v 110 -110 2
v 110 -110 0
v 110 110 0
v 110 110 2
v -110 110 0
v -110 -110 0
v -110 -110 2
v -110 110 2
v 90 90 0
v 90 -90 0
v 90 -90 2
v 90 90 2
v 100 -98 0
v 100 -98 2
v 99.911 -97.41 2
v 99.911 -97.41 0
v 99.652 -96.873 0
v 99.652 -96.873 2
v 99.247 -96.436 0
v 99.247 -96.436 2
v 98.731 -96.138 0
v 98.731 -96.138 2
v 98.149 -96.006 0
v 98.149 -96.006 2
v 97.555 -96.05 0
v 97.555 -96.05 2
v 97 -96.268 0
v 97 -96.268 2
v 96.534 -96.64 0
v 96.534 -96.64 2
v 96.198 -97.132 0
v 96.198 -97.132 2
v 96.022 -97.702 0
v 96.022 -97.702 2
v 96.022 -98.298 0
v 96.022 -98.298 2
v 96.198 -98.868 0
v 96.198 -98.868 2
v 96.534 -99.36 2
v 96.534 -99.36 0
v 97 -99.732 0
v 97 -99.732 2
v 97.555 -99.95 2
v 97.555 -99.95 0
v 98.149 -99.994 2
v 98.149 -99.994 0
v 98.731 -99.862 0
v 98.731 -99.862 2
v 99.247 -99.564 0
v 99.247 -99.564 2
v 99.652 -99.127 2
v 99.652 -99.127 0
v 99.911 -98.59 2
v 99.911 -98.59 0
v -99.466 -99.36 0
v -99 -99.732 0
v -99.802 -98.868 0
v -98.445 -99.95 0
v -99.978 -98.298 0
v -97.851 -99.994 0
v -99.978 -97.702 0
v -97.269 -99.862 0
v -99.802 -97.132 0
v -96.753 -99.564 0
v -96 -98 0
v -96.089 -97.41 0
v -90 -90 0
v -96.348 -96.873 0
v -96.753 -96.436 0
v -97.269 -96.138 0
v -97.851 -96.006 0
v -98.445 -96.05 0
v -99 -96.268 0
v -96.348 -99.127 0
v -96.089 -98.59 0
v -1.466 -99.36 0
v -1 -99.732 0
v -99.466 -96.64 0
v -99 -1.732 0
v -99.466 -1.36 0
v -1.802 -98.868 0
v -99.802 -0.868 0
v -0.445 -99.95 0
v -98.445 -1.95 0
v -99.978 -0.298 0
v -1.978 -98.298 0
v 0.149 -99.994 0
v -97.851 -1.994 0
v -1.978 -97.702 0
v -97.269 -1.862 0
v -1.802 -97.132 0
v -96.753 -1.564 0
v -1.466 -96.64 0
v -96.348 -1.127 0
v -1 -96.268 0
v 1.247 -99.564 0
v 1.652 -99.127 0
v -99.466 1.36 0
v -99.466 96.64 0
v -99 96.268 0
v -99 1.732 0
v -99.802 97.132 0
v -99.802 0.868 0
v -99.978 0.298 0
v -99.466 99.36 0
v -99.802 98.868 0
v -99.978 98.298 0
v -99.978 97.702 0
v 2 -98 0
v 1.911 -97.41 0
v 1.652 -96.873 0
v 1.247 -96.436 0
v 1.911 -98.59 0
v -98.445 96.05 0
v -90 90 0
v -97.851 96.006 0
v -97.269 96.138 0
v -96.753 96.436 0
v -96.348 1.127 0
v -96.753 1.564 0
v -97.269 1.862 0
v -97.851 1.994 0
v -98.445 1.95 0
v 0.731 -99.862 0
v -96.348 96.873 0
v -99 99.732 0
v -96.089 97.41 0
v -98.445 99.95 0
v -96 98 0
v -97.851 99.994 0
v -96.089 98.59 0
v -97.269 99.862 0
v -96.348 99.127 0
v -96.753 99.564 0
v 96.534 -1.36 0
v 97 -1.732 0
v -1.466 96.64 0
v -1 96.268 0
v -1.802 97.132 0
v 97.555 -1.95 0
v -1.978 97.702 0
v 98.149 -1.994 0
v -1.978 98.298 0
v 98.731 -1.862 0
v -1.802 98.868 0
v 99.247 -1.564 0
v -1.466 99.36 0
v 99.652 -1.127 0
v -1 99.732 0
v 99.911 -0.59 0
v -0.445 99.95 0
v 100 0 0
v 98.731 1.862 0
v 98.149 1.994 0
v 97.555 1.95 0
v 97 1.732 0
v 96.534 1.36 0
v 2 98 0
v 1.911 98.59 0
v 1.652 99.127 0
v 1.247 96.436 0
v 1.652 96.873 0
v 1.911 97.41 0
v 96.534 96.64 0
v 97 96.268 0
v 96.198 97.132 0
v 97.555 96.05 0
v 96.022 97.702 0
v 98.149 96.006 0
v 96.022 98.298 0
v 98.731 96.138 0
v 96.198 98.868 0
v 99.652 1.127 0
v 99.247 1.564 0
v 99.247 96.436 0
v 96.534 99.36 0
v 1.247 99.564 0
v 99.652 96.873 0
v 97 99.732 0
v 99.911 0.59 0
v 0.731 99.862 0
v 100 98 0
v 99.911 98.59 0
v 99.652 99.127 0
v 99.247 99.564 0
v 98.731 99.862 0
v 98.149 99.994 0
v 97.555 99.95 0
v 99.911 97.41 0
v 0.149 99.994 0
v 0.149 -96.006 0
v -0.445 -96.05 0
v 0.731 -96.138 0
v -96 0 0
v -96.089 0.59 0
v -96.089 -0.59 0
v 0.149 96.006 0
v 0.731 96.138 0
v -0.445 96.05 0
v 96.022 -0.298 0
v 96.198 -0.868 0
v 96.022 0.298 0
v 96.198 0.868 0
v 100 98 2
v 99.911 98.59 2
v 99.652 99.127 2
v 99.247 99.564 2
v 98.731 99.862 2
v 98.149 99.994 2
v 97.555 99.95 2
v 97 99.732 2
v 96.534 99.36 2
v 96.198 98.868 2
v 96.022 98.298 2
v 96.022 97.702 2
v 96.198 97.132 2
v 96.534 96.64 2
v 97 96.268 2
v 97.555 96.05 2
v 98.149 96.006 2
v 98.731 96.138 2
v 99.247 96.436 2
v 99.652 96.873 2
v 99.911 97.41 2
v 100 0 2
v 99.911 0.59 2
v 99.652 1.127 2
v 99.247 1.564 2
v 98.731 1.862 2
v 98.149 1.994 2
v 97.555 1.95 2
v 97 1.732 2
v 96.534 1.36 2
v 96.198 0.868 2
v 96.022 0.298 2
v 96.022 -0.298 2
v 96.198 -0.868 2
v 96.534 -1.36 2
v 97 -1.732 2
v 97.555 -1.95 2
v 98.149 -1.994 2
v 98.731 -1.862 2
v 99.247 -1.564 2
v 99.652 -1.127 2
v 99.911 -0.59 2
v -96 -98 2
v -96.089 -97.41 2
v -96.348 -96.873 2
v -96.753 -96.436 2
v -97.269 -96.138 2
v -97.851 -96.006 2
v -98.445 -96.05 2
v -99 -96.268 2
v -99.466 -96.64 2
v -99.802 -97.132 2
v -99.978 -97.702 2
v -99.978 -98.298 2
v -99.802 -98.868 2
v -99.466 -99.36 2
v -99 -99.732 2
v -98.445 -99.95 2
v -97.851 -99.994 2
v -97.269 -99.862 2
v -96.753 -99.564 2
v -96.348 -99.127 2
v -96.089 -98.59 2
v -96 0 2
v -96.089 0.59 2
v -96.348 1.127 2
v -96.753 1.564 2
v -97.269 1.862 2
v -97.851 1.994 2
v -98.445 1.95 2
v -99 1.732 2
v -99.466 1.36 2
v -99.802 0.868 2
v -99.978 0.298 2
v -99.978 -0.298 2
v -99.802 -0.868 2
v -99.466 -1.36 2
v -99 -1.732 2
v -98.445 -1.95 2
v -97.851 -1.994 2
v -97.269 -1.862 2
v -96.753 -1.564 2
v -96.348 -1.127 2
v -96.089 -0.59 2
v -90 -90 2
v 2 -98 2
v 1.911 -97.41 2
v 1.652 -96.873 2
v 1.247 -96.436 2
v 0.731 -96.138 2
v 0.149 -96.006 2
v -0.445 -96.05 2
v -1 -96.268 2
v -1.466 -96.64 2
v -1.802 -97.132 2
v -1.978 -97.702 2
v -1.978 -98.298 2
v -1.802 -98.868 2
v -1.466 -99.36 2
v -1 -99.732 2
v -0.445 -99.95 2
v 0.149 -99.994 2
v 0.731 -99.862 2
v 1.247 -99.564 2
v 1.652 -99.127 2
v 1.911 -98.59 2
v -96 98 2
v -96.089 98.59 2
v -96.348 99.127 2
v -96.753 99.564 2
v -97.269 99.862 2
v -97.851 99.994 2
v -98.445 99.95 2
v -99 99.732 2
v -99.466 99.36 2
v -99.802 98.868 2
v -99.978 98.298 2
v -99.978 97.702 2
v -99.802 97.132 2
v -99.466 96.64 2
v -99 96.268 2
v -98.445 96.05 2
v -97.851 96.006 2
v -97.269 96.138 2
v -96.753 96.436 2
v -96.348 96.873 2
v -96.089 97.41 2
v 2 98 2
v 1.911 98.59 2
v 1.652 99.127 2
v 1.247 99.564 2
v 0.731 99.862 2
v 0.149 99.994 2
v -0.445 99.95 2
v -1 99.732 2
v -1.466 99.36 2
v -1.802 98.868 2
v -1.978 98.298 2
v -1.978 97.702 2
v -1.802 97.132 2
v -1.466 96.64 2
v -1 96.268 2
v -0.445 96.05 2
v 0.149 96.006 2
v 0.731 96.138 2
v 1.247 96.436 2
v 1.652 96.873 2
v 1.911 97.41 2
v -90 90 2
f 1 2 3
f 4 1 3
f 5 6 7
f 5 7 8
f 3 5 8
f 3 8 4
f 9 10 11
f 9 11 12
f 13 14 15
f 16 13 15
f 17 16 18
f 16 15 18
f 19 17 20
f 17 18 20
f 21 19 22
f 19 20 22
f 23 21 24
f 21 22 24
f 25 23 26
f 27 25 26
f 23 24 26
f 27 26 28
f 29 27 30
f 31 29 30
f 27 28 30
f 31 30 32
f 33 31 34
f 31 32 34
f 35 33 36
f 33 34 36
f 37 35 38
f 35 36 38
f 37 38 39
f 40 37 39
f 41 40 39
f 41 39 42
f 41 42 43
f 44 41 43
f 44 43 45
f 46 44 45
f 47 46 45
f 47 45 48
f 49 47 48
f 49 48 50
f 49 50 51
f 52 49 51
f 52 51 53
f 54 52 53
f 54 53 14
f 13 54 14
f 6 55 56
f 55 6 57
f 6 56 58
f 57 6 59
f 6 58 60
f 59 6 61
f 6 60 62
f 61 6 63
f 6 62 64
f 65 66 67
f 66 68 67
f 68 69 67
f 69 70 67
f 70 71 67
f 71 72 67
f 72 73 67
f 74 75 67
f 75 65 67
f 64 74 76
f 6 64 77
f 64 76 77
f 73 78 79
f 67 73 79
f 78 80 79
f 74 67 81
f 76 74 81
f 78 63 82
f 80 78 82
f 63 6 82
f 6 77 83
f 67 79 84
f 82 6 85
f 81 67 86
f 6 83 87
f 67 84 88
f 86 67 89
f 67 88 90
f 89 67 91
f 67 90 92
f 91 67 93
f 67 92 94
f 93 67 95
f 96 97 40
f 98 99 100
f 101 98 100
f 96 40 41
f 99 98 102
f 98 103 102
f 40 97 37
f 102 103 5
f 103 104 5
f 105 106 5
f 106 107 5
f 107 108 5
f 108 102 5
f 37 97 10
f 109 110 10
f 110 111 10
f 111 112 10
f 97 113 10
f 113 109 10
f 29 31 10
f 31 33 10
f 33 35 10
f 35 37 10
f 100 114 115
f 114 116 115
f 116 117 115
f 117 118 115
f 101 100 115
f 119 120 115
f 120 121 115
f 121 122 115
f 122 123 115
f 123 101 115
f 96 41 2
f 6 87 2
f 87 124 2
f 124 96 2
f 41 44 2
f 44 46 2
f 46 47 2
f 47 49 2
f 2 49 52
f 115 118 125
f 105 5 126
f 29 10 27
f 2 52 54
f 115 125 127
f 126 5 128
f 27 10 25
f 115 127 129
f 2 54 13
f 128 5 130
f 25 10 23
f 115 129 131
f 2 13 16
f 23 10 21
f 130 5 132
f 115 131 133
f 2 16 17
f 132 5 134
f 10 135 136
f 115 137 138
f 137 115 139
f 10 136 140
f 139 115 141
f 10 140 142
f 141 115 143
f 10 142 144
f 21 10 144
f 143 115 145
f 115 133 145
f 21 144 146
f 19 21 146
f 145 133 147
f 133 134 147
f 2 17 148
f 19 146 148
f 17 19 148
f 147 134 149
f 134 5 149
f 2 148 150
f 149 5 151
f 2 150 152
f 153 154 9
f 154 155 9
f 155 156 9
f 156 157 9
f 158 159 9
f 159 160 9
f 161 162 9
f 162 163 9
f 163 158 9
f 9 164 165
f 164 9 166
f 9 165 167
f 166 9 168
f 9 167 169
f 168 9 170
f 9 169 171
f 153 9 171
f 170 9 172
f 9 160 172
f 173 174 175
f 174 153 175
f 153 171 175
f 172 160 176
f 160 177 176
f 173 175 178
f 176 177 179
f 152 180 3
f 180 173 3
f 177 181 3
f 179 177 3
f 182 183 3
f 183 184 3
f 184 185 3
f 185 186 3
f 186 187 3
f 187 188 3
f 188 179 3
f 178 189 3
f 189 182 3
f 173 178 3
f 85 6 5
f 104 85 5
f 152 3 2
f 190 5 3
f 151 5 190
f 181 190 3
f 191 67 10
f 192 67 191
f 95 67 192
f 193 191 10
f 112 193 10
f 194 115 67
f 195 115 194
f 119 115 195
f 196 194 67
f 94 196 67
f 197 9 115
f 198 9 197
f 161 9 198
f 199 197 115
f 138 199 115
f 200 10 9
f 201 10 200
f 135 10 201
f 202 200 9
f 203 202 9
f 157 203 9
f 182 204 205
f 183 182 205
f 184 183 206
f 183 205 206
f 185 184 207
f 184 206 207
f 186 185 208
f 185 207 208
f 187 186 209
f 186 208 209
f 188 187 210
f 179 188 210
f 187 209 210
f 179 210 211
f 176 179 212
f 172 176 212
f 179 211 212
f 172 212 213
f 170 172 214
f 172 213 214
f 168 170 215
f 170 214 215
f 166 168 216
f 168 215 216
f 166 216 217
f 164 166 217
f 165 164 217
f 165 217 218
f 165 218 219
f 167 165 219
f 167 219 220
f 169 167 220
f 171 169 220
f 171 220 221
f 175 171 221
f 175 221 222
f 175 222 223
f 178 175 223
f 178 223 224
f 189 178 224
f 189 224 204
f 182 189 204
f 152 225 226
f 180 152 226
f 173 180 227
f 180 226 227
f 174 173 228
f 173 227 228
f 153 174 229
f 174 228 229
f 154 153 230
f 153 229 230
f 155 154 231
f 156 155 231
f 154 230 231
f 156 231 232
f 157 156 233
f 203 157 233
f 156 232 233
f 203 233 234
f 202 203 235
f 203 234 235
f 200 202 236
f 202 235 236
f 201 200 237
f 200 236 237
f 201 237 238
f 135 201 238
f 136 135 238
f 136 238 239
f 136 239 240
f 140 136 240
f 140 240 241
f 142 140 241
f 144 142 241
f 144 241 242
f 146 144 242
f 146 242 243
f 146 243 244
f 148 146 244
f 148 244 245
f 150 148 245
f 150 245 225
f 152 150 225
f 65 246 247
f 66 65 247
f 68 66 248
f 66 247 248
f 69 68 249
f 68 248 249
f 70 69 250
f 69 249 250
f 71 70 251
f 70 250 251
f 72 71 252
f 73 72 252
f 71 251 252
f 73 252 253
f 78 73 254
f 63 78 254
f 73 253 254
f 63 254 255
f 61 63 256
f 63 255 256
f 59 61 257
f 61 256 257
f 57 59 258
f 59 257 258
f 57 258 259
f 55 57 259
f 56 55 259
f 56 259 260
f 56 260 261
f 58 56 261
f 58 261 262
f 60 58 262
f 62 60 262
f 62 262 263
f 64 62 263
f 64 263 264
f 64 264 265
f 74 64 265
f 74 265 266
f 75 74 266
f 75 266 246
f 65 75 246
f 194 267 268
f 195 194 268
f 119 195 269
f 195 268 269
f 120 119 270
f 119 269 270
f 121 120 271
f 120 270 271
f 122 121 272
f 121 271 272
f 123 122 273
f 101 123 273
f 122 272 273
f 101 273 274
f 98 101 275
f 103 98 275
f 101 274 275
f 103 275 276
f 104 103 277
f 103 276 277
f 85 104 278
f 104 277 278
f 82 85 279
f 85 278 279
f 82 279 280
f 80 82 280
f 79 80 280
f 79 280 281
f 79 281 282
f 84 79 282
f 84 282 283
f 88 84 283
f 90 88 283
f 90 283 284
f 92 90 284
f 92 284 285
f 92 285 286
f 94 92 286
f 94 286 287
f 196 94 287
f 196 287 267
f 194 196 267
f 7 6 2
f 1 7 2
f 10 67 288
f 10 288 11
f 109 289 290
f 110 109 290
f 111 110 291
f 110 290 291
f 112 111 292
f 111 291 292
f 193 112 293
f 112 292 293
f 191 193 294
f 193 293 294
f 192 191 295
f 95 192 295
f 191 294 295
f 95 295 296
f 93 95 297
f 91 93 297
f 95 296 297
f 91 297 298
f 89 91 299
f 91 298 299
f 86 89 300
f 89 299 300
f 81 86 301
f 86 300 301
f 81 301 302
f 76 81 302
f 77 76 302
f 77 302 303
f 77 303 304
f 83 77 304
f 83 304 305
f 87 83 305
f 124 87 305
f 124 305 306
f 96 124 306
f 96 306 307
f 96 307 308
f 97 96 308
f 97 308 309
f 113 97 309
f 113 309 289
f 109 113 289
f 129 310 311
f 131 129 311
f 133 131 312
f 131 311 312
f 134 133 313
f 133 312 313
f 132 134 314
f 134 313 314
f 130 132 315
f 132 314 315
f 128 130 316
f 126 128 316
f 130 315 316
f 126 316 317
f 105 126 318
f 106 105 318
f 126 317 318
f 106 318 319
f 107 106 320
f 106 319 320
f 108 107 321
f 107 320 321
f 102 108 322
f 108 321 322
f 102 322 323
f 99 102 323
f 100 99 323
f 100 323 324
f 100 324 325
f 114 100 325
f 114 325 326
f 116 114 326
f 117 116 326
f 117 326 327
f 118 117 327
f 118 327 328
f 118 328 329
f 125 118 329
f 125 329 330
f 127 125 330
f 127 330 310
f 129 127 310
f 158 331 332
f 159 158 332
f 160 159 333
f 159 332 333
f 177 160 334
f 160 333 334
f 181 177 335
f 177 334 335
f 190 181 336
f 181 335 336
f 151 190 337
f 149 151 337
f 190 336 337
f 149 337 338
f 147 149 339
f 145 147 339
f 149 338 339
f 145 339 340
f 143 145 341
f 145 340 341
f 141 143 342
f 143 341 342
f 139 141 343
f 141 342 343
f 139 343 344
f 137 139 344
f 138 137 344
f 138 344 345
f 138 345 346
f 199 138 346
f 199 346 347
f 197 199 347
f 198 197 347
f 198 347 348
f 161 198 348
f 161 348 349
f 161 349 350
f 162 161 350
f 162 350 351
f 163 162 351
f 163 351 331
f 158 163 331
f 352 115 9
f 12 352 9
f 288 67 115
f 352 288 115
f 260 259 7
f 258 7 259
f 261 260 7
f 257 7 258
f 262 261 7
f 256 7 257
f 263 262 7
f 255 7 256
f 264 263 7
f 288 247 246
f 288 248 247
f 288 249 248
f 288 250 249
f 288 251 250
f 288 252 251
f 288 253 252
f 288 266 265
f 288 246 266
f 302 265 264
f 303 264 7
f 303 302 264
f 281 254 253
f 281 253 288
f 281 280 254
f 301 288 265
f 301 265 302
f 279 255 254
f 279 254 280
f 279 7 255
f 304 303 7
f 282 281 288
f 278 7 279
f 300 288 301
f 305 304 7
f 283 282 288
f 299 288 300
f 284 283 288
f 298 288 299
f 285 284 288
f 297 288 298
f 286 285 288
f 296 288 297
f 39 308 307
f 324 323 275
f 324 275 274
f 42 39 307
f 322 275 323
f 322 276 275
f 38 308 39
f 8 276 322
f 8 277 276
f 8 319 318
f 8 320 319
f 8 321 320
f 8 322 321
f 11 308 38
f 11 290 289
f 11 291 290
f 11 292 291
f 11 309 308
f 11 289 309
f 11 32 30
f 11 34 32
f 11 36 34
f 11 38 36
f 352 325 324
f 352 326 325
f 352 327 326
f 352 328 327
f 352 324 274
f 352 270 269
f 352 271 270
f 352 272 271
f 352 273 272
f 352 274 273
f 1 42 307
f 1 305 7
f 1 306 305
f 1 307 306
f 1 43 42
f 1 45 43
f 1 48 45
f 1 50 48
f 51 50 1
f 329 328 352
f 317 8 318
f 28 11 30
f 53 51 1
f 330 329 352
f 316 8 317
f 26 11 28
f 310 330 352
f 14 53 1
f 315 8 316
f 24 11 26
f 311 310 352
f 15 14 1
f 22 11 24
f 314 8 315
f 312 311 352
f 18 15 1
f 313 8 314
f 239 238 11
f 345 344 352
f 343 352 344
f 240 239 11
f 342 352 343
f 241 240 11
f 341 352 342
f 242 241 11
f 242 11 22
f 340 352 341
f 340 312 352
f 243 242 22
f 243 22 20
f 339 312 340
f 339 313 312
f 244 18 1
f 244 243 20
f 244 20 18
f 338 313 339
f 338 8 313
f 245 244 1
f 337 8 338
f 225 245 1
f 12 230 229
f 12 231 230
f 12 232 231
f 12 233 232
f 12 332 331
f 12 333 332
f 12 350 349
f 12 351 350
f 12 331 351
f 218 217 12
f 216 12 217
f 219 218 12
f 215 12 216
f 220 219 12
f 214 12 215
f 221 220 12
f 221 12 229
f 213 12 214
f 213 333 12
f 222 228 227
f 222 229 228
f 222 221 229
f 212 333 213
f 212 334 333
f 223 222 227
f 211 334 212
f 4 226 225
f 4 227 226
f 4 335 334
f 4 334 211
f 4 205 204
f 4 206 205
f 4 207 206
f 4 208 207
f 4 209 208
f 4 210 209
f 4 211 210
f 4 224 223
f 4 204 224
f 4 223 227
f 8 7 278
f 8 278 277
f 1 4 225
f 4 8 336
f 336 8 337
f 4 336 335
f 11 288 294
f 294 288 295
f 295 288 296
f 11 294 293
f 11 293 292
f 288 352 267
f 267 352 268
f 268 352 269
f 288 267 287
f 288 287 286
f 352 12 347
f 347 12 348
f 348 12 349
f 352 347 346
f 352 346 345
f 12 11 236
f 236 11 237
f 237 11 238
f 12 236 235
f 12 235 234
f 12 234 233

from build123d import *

# Parameters (mm, degrees)
SKETCH1_W                 = 220
SKETCH1_H                 = 220
SKETCH1_W_2               = 180
SKETCH1_H_2               = 180
EXTRUDE_THIN1_DEPTH       = 2
SKETCH2_R                 = 2
CUT_EXTRUDE1_DEPTH        = 10
LPATTERN1_COUNT           = 2
LPATTERN1_PITCH           = 98
LPATTERN1_COL_COUNT       = 2
LPATTERN1_COL_PITCH       = 98
LPATTERN2_COPY_1_SKETCH_R = 2
LPATTERN2_COPY_1_DEPTH    = 10
LPATTERN2_COPY_2_SKETCH_R = 2
LPATTERN2_COPY_2_DEPTH    = 10
LPATTERN2_COPY_3_SKETCH_R = 2
LPATTERN2_COPY_3_DEPTH    = 10
LPATTERN2_COPY_4_SKETCH_R = 2
LPATTERN2_COPY_4_DEPTH    = 10
LPATTERN3_COUNT           = 3
LPATTERN3_PITCH           = 196


with BuildPart() as part:
    # Sketch1 → Extrude-Thin1 (new body)
    with BuildSketch(Plane.XY):
        Rectangle(SKETCH1_W, SKETCH1_H)
        Rectangle(SKETCH1_W_2, SKETCH1_H_2, mode=Mode.SUBTRACT)
    extrude(amount=EXTRUDE_THIN1_DEPTH)

    # Sketch2 → Cut-Extrude1 (cut)
    with BuildSketch(Plane.XY.offset(2)):
        with Locations((0, 98)):
            Circle(SKETCH2_R)
    cut_extrude1 = extrude(amount=-CUT_EXTRUDE1_DEPTH, mode=Mode.SUBTRACT)

    # LPattern1: Cut-Extrude1 ×2
    with Locations(*[(i * LPATTERN1_PITCH, 0, 0) for i in range(1, LPATTERN1_COUNT)]):
        add(cut_extrude1, mode=Mode.SUBTRACT)

    # LPattern1 col: Cut-Extrude1 ×2
    with Locations(*[(-i * LPATTERN1_COL_PITCH, 0, 0) for i in range(1, LPATTERN1_COL_COUNT)]):
        add(cut_extrude1, mode=Mode.SUBTRACT)

    # LPattern2 copy 1 sketch → LPattern2 copy 1 (cut)
    with BuildSketch(Plane(origin=(98, -98, 2), x_dir=(1, 0, 0), z_dir=(0, 0, 1))):
        with Locations((0, 98)):
            Circle(LPATTERN2_COPY_1_SKETCH_R)
    extrude(amount=-LPATTERN2_COPY_1_DEPTH, mode=Mode.SUBTRACT)

    # LPattern2 copy 2 sketch → LPattern2 copy 2 (cut)
    with BuildSketch(Plane(origin=(98, -196, 2), x_dir=(1, 0, 0), z_dir=(0, 0, 1))):
        with Locations((0, 98)):
            Circle(LPATTERN2_COPY_2_SKETCH_R)
    extrude(amount=-LPATTERN2_COPY_2_DEPTH, mode=Mode.SUBTRACT)

    # LPattern2 copy 3 sketch → LPattern2 copy 3 (cut)
    with BuildSketch(Plane(origin=(-98, -98, 2), x_dir=(1, 0, 0), z_dir=(0, 0, 1))):
        with Locations((0, 98)):
            Circle(LPATTERN2_COPY_3_SKETCH_R)
    extrude(amount=-LPATTERN2_COPY_3_DEPTH, mode=Mode.SUBTRACT)

    # LPattern2 copy 4 sketch → LPattern2 copy 4 (cut)
    with BuildSketch(Plane(origin=(-98, -196, 2), x_dir=(1, 0, 0), z_dir=(0, 0, 1))):
        with Locations((0, 98)):
            Circle(LPATTERN2_COPY_4_SKETCH_R)
    extrude(amount=-LPATTERN2_COPY_4_DEPTH, mode=Mode.SUBTRACT)

    # LPattern3: Cut-Extrude1 ×3
    with Locations(*[(0, -i * LPATTERN3_PITCH, 0) for i in range(1, LPATTERN3_COUNT)]):
        add(cut_extrude1, mode=Mode.SUBTRACT)


solid = part.part
